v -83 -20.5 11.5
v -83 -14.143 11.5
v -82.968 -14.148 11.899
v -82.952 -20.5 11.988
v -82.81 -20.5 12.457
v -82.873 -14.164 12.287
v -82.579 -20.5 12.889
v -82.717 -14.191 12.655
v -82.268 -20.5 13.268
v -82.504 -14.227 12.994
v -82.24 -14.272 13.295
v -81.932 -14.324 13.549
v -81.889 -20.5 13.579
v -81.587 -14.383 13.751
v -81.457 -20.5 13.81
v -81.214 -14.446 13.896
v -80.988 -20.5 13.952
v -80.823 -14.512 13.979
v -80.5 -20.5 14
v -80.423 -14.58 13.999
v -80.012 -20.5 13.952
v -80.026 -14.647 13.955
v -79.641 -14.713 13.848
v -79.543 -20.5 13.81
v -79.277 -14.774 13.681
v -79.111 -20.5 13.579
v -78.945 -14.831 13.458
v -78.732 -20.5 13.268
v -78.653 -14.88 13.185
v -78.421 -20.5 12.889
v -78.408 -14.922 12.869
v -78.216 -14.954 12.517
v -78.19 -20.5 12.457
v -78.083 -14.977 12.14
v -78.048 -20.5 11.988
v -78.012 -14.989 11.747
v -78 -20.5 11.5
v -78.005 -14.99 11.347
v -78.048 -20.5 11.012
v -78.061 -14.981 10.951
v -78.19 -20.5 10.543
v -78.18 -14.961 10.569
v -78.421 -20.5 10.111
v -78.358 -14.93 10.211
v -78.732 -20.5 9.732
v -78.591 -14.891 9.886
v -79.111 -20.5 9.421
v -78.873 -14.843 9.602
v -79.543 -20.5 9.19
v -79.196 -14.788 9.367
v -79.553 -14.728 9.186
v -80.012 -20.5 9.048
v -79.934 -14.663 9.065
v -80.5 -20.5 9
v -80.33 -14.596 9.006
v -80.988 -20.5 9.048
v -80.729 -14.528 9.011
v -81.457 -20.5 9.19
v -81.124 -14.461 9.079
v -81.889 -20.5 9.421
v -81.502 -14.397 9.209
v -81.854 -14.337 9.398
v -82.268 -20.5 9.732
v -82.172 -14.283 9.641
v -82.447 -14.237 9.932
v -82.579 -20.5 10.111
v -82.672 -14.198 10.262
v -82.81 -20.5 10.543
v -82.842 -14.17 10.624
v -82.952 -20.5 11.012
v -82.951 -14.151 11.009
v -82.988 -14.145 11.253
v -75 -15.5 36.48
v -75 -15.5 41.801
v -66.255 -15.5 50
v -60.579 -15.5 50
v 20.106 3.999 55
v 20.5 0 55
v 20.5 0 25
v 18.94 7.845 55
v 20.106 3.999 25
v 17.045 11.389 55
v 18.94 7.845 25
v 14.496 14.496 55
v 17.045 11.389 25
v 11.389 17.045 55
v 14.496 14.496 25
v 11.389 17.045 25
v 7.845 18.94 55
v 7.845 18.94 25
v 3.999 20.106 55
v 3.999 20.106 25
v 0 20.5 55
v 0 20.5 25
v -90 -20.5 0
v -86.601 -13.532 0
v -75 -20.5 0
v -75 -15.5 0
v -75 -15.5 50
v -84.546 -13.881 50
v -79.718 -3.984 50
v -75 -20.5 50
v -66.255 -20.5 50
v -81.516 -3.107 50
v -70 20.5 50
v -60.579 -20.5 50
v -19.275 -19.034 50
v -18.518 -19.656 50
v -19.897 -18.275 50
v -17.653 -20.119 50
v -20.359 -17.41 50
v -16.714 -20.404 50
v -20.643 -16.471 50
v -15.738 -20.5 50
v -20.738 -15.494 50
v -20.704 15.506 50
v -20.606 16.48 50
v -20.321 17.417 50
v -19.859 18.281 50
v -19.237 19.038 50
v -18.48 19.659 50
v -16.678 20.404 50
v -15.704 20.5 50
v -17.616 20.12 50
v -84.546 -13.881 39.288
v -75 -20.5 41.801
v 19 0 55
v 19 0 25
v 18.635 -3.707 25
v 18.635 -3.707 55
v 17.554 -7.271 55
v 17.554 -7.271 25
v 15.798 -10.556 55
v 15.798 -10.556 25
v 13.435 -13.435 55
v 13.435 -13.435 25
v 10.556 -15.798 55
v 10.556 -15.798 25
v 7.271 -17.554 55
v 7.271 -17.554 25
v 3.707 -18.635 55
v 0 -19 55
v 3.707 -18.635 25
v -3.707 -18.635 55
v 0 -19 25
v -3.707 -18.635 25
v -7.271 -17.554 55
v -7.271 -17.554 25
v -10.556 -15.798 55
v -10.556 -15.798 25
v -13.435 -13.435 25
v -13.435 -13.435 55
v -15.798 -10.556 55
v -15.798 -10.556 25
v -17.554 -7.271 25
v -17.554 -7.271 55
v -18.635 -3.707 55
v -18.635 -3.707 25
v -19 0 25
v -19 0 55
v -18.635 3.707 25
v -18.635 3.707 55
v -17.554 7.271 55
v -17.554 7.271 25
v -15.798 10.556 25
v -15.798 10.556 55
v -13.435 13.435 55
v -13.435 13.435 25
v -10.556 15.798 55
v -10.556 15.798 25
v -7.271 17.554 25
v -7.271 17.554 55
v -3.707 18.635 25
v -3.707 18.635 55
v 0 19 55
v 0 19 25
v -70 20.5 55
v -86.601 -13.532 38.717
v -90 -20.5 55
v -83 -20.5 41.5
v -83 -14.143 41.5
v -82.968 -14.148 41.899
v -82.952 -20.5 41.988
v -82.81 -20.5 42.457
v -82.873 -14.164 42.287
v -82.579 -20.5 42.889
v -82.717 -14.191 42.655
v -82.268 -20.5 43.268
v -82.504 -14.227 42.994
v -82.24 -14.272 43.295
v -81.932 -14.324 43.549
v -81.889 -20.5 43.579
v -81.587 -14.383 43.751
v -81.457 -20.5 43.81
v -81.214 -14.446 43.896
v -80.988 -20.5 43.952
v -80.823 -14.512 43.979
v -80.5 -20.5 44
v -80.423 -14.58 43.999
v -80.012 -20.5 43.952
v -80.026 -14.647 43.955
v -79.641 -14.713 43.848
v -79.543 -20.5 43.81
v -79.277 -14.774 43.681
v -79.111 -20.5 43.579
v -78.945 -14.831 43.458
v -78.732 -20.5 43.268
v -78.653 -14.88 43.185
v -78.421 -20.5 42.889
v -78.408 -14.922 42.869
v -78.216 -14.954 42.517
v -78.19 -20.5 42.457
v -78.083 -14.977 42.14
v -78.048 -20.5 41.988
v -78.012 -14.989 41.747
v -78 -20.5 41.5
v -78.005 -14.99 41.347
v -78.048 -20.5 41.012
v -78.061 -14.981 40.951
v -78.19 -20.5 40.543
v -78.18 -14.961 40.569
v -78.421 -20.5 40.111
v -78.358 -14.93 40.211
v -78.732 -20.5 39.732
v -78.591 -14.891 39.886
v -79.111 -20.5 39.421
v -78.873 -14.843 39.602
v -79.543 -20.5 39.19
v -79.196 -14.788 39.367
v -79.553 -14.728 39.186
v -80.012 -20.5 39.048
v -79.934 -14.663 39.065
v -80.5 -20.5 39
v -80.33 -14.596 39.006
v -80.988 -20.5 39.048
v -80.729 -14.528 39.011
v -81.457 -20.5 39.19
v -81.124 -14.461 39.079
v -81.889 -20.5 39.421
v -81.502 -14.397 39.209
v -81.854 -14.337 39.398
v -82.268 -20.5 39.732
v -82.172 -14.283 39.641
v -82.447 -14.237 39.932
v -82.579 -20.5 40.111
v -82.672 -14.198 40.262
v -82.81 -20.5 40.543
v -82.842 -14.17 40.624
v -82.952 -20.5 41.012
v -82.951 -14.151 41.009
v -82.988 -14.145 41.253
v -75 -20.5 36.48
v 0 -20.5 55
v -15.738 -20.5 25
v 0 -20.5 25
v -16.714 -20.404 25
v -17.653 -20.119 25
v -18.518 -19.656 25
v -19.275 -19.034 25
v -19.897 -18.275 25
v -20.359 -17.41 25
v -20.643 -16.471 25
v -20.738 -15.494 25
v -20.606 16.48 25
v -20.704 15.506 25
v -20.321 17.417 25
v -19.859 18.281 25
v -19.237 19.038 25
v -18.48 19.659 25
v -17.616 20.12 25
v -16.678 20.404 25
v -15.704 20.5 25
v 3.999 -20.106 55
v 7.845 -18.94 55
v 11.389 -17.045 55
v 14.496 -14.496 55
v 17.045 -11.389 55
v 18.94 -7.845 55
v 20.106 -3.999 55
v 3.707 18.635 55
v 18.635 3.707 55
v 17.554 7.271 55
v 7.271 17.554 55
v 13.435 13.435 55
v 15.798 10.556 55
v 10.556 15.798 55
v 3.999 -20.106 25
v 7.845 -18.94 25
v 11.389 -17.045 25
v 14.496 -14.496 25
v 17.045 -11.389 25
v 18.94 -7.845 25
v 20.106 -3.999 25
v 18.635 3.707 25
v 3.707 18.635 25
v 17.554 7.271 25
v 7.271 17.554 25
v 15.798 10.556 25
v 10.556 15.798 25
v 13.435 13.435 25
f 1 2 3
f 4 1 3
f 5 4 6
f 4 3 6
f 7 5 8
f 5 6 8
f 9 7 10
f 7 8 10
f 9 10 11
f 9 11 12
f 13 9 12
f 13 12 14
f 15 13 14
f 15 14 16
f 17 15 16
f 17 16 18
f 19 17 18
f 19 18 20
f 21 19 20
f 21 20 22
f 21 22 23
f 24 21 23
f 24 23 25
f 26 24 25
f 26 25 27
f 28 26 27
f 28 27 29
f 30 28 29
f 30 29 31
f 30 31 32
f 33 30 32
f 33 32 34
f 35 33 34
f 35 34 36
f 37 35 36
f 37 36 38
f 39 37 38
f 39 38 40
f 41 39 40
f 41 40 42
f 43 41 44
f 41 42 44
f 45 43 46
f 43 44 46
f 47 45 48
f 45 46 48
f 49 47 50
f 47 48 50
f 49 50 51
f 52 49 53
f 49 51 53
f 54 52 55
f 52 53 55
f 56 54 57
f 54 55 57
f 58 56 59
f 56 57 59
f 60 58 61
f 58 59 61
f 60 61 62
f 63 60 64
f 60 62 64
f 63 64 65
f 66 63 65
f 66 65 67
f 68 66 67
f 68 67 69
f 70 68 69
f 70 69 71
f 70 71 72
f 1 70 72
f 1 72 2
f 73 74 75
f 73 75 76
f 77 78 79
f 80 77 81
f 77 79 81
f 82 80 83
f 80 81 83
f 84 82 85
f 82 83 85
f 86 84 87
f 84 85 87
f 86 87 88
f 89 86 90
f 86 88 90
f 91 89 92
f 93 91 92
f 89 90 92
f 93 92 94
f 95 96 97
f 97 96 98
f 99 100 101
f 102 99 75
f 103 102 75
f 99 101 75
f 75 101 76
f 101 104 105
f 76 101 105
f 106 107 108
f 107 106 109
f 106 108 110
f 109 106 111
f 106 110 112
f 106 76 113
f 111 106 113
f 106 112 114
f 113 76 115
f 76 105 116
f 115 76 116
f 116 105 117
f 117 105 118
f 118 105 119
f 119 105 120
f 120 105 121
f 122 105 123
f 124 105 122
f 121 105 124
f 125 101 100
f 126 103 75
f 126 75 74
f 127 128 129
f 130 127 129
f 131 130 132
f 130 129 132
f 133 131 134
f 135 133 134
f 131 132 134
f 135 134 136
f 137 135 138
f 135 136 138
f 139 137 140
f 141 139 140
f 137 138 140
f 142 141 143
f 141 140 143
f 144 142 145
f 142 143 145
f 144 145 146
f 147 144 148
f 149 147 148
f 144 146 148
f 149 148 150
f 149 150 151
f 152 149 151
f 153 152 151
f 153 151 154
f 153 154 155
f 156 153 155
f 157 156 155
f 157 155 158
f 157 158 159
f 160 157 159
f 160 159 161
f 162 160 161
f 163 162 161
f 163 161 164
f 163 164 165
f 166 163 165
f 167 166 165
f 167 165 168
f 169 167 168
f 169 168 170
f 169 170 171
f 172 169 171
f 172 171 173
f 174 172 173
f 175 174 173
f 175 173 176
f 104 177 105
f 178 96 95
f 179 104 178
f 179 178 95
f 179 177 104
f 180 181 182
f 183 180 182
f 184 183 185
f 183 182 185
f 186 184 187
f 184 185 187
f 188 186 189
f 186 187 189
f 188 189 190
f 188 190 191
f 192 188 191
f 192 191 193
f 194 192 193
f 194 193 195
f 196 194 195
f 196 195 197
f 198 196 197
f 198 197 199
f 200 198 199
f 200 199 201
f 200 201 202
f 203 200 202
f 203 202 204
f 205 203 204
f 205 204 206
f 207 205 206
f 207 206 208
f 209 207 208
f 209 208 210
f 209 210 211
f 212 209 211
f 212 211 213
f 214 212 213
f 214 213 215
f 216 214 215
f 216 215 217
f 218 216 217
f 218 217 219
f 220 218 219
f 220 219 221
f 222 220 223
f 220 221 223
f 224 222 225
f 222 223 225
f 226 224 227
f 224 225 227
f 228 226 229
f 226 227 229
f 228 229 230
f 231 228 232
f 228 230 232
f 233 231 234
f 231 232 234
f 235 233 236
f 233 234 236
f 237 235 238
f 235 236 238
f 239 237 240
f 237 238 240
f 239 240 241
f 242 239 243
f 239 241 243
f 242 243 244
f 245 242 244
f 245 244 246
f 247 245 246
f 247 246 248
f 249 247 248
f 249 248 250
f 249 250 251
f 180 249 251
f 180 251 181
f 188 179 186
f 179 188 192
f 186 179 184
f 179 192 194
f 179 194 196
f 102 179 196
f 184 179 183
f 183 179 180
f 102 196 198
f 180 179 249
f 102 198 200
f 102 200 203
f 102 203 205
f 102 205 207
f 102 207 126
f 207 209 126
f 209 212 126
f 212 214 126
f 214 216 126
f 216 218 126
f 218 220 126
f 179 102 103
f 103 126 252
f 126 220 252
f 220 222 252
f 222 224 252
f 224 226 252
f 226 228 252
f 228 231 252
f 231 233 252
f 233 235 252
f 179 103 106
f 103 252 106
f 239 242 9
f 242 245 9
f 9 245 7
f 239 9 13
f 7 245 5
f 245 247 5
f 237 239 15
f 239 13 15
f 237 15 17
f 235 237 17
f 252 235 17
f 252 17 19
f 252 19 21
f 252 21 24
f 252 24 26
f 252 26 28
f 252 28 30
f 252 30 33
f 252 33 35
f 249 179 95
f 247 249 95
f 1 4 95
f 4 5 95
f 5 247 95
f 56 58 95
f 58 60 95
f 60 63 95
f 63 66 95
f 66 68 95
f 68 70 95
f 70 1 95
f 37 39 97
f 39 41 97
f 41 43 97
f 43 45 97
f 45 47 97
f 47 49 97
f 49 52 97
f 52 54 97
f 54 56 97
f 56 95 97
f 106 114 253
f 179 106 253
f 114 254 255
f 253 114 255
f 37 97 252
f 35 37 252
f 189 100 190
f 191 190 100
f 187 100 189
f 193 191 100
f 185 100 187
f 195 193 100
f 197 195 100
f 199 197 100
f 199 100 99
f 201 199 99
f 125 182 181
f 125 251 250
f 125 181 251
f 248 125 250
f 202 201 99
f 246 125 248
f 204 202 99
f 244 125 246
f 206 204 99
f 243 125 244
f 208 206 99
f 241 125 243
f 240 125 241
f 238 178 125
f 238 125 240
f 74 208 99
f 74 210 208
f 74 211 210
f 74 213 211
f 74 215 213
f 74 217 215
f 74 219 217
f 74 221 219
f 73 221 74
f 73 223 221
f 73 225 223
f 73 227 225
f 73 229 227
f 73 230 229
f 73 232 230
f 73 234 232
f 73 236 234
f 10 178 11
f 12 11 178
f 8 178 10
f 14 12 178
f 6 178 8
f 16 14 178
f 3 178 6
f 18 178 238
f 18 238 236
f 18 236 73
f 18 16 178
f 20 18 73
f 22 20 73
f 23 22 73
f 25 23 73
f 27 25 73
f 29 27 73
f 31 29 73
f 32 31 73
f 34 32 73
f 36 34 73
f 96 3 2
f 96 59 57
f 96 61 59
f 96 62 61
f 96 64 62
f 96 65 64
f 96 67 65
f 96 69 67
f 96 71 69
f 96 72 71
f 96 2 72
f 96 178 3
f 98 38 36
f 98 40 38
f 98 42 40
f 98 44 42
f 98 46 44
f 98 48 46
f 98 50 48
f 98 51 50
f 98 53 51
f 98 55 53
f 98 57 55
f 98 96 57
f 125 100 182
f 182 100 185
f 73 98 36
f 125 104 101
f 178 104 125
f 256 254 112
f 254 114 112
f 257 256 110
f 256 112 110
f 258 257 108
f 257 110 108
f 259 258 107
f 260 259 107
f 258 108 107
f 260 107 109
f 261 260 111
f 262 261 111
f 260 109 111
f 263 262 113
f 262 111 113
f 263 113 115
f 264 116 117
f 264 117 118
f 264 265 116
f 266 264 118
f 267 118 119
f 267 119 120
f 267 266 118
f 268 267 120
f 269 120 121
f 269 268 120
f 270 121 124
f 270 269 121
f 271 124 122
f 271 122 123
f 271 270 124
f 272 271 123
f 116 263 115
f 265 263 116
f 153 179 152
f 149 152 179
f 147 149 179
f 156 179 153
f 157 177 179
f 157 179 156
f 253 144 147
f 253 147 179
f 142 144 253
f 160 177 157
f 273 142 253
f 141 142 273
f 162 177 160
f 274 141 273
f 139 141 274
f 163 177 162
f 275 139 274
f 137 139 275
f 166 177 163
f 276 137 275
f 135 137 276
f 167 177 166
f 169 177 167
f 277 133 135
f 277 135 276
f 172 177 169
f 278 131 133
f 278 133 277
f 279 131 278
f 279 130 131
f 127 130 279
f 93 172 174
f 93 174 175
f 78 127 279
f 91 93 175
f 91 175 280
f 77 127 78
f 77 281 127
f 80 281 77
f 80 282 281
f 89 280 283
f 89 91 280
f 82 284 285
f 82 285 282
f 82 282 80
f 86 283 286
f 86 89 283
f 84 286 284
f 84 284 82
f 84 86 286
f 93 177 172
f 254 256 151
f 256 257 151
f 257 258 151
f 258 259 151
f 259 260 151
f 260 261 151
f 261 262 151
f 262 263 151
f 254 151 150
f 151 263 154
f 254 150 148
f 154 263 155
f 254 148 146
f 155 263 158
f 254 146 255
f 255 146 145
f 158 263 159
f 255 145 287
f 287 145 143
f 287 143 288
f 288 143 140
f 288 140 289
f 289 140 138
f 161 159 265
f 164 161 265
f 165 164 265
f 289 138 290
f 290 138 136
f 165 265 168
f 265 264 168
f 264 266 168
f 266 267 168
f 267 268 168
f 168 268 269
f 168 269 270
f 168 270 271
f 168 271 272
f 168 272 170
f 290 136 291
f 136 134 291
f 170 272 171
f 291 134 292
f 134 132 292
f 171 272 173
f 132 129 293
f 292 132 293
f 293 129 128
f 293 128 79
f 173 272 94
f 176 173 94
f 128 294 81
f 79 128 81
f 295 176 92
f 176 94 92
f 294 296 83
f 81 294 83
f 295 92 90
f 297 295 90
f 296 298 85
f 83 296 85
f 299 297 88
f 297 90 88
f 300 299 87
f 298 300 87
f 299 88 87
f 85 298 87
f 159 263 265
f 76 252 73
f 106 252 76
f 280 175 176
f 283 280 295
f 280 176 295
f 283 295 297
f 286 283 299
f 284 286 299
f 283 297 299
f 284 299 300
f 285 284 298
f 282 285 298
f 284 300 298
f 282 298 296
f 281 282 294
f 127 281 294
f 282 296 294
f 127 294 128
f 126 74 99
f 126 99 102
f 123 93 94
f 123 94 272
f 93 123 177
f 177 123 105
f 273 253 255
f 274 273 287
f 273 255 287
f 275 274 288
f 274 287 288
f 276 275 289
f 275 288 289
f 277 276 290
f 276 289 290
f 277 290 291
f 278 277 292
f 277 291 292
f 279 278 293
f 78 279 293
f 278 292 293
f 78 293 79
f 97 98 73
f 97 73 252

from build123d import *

# Parameters (mm, degrees)
F1_DEPTH  = 55
F3_DEPTH  = 50
F4_W      = 46.6654431075
F4_H      = 57.836631313
F5_DEPTH  = 25
F6_R      = 5
F8_D      = 5
F10_DEPTH = 5
F12_DEPTH = 2


with BuildPart() as f1:
    # F0 (on Top) → F1 (new body)
    with BuildSketch(Plane.XY):
        with BuildLine():
            ThreePointArc((0, -20.5), (14.4956890143, -14.4956890143), (20.5, 0))
            ThreePointArc((20.5, 0), (14.4956890143, 14.4956890143), (0, 20.5))
            ThreePointArc((0, 20.5), (-20.5, 0), (0, -20.5))
        make_face()
        with BuildLine():
            ThreePointArc((19, 0), (-13.4350288425, -13.4350288425), (0, 19))
            ThreePointArc((0, 19), (13.4350288425, 13.4350288425), (19, 0))
        make_face(mode=Mode.SUBTRACT)
        with BuildLine():
            ThreePointArc((0, -20.5), (-20.5, 0), (0, 20.5))
            Line((0, 20.5), (-70, 20.5))
            Line((-70, 20.5), (-90, -20.5))
            Line((-90, -20.5), (0, -20.5))
        make_face()
    extrude(amount=F1_DEPTH)

    # F2 (on face) → F3 (cut)
    with BuildSketch(Plane.XY):
        Polygon((-20.693905686, 24.13287099), (-92.3021333856, 24.13287099), (-92.6832251204, -12.49999901), (-75, -15.5), (-75, -22.0035649836), (-20.7452352142, -22.0035649836), align=None)
    extrude(amount=F3_DEPTH, mode=Mode.SUBTRACT)

    # F4 (on face) → F5 (cut)
    with BuildSketch(Plane.XY):
        with Locations((-0.7558101788, 1.7380928621)):
            Rectangle(F4_W, F4_H)
    extrude(amount=F5_DEPTH, mode=Mode.SUBTRACT)

    # F6
    f6_edges = [f1.edges().sort_by_distance(p)[0] for p in [
        (-20.697947, 20.5, 37.5),
        (-20.743562, -20.5, 37.5),
    ]]
    fillet(f6_edges, radius=F6_R)

    # F8 (through all)
    with Locations(Plane.XZ.offset(20.5)):
        with Locations((-80.5, 41.5), (-80.5, 11.5)):
            Hole(F8_D / 2)

    # F9 (on face) → F10 (join)
    with BuildSketch(Plane.XZ.offset(20.5)):
        Polygon((-66.2546011695, 50), (-75, 41.8011878794), (-75, 36.4798588918), (-60.5785174124, 50), align=None)
    extrude(amount=-F10_DEPTH)

    # F11 (on face) → F12 (join)
    with BuildSketch(Plane(origin=(-64.6227775108, 31.5233061028, 0), x_dir=(-0.438423632, -0.8987684456, 0), z_dir=(-0.8987684456, 0.438423632, 0))):
        Polygon((50.1299122344, 50), (38.5309847388, 50), (50.1299122344, 38.7167511187), align=None)
    extrude(amount=-F12_DEPTH)


solid = f1.part
